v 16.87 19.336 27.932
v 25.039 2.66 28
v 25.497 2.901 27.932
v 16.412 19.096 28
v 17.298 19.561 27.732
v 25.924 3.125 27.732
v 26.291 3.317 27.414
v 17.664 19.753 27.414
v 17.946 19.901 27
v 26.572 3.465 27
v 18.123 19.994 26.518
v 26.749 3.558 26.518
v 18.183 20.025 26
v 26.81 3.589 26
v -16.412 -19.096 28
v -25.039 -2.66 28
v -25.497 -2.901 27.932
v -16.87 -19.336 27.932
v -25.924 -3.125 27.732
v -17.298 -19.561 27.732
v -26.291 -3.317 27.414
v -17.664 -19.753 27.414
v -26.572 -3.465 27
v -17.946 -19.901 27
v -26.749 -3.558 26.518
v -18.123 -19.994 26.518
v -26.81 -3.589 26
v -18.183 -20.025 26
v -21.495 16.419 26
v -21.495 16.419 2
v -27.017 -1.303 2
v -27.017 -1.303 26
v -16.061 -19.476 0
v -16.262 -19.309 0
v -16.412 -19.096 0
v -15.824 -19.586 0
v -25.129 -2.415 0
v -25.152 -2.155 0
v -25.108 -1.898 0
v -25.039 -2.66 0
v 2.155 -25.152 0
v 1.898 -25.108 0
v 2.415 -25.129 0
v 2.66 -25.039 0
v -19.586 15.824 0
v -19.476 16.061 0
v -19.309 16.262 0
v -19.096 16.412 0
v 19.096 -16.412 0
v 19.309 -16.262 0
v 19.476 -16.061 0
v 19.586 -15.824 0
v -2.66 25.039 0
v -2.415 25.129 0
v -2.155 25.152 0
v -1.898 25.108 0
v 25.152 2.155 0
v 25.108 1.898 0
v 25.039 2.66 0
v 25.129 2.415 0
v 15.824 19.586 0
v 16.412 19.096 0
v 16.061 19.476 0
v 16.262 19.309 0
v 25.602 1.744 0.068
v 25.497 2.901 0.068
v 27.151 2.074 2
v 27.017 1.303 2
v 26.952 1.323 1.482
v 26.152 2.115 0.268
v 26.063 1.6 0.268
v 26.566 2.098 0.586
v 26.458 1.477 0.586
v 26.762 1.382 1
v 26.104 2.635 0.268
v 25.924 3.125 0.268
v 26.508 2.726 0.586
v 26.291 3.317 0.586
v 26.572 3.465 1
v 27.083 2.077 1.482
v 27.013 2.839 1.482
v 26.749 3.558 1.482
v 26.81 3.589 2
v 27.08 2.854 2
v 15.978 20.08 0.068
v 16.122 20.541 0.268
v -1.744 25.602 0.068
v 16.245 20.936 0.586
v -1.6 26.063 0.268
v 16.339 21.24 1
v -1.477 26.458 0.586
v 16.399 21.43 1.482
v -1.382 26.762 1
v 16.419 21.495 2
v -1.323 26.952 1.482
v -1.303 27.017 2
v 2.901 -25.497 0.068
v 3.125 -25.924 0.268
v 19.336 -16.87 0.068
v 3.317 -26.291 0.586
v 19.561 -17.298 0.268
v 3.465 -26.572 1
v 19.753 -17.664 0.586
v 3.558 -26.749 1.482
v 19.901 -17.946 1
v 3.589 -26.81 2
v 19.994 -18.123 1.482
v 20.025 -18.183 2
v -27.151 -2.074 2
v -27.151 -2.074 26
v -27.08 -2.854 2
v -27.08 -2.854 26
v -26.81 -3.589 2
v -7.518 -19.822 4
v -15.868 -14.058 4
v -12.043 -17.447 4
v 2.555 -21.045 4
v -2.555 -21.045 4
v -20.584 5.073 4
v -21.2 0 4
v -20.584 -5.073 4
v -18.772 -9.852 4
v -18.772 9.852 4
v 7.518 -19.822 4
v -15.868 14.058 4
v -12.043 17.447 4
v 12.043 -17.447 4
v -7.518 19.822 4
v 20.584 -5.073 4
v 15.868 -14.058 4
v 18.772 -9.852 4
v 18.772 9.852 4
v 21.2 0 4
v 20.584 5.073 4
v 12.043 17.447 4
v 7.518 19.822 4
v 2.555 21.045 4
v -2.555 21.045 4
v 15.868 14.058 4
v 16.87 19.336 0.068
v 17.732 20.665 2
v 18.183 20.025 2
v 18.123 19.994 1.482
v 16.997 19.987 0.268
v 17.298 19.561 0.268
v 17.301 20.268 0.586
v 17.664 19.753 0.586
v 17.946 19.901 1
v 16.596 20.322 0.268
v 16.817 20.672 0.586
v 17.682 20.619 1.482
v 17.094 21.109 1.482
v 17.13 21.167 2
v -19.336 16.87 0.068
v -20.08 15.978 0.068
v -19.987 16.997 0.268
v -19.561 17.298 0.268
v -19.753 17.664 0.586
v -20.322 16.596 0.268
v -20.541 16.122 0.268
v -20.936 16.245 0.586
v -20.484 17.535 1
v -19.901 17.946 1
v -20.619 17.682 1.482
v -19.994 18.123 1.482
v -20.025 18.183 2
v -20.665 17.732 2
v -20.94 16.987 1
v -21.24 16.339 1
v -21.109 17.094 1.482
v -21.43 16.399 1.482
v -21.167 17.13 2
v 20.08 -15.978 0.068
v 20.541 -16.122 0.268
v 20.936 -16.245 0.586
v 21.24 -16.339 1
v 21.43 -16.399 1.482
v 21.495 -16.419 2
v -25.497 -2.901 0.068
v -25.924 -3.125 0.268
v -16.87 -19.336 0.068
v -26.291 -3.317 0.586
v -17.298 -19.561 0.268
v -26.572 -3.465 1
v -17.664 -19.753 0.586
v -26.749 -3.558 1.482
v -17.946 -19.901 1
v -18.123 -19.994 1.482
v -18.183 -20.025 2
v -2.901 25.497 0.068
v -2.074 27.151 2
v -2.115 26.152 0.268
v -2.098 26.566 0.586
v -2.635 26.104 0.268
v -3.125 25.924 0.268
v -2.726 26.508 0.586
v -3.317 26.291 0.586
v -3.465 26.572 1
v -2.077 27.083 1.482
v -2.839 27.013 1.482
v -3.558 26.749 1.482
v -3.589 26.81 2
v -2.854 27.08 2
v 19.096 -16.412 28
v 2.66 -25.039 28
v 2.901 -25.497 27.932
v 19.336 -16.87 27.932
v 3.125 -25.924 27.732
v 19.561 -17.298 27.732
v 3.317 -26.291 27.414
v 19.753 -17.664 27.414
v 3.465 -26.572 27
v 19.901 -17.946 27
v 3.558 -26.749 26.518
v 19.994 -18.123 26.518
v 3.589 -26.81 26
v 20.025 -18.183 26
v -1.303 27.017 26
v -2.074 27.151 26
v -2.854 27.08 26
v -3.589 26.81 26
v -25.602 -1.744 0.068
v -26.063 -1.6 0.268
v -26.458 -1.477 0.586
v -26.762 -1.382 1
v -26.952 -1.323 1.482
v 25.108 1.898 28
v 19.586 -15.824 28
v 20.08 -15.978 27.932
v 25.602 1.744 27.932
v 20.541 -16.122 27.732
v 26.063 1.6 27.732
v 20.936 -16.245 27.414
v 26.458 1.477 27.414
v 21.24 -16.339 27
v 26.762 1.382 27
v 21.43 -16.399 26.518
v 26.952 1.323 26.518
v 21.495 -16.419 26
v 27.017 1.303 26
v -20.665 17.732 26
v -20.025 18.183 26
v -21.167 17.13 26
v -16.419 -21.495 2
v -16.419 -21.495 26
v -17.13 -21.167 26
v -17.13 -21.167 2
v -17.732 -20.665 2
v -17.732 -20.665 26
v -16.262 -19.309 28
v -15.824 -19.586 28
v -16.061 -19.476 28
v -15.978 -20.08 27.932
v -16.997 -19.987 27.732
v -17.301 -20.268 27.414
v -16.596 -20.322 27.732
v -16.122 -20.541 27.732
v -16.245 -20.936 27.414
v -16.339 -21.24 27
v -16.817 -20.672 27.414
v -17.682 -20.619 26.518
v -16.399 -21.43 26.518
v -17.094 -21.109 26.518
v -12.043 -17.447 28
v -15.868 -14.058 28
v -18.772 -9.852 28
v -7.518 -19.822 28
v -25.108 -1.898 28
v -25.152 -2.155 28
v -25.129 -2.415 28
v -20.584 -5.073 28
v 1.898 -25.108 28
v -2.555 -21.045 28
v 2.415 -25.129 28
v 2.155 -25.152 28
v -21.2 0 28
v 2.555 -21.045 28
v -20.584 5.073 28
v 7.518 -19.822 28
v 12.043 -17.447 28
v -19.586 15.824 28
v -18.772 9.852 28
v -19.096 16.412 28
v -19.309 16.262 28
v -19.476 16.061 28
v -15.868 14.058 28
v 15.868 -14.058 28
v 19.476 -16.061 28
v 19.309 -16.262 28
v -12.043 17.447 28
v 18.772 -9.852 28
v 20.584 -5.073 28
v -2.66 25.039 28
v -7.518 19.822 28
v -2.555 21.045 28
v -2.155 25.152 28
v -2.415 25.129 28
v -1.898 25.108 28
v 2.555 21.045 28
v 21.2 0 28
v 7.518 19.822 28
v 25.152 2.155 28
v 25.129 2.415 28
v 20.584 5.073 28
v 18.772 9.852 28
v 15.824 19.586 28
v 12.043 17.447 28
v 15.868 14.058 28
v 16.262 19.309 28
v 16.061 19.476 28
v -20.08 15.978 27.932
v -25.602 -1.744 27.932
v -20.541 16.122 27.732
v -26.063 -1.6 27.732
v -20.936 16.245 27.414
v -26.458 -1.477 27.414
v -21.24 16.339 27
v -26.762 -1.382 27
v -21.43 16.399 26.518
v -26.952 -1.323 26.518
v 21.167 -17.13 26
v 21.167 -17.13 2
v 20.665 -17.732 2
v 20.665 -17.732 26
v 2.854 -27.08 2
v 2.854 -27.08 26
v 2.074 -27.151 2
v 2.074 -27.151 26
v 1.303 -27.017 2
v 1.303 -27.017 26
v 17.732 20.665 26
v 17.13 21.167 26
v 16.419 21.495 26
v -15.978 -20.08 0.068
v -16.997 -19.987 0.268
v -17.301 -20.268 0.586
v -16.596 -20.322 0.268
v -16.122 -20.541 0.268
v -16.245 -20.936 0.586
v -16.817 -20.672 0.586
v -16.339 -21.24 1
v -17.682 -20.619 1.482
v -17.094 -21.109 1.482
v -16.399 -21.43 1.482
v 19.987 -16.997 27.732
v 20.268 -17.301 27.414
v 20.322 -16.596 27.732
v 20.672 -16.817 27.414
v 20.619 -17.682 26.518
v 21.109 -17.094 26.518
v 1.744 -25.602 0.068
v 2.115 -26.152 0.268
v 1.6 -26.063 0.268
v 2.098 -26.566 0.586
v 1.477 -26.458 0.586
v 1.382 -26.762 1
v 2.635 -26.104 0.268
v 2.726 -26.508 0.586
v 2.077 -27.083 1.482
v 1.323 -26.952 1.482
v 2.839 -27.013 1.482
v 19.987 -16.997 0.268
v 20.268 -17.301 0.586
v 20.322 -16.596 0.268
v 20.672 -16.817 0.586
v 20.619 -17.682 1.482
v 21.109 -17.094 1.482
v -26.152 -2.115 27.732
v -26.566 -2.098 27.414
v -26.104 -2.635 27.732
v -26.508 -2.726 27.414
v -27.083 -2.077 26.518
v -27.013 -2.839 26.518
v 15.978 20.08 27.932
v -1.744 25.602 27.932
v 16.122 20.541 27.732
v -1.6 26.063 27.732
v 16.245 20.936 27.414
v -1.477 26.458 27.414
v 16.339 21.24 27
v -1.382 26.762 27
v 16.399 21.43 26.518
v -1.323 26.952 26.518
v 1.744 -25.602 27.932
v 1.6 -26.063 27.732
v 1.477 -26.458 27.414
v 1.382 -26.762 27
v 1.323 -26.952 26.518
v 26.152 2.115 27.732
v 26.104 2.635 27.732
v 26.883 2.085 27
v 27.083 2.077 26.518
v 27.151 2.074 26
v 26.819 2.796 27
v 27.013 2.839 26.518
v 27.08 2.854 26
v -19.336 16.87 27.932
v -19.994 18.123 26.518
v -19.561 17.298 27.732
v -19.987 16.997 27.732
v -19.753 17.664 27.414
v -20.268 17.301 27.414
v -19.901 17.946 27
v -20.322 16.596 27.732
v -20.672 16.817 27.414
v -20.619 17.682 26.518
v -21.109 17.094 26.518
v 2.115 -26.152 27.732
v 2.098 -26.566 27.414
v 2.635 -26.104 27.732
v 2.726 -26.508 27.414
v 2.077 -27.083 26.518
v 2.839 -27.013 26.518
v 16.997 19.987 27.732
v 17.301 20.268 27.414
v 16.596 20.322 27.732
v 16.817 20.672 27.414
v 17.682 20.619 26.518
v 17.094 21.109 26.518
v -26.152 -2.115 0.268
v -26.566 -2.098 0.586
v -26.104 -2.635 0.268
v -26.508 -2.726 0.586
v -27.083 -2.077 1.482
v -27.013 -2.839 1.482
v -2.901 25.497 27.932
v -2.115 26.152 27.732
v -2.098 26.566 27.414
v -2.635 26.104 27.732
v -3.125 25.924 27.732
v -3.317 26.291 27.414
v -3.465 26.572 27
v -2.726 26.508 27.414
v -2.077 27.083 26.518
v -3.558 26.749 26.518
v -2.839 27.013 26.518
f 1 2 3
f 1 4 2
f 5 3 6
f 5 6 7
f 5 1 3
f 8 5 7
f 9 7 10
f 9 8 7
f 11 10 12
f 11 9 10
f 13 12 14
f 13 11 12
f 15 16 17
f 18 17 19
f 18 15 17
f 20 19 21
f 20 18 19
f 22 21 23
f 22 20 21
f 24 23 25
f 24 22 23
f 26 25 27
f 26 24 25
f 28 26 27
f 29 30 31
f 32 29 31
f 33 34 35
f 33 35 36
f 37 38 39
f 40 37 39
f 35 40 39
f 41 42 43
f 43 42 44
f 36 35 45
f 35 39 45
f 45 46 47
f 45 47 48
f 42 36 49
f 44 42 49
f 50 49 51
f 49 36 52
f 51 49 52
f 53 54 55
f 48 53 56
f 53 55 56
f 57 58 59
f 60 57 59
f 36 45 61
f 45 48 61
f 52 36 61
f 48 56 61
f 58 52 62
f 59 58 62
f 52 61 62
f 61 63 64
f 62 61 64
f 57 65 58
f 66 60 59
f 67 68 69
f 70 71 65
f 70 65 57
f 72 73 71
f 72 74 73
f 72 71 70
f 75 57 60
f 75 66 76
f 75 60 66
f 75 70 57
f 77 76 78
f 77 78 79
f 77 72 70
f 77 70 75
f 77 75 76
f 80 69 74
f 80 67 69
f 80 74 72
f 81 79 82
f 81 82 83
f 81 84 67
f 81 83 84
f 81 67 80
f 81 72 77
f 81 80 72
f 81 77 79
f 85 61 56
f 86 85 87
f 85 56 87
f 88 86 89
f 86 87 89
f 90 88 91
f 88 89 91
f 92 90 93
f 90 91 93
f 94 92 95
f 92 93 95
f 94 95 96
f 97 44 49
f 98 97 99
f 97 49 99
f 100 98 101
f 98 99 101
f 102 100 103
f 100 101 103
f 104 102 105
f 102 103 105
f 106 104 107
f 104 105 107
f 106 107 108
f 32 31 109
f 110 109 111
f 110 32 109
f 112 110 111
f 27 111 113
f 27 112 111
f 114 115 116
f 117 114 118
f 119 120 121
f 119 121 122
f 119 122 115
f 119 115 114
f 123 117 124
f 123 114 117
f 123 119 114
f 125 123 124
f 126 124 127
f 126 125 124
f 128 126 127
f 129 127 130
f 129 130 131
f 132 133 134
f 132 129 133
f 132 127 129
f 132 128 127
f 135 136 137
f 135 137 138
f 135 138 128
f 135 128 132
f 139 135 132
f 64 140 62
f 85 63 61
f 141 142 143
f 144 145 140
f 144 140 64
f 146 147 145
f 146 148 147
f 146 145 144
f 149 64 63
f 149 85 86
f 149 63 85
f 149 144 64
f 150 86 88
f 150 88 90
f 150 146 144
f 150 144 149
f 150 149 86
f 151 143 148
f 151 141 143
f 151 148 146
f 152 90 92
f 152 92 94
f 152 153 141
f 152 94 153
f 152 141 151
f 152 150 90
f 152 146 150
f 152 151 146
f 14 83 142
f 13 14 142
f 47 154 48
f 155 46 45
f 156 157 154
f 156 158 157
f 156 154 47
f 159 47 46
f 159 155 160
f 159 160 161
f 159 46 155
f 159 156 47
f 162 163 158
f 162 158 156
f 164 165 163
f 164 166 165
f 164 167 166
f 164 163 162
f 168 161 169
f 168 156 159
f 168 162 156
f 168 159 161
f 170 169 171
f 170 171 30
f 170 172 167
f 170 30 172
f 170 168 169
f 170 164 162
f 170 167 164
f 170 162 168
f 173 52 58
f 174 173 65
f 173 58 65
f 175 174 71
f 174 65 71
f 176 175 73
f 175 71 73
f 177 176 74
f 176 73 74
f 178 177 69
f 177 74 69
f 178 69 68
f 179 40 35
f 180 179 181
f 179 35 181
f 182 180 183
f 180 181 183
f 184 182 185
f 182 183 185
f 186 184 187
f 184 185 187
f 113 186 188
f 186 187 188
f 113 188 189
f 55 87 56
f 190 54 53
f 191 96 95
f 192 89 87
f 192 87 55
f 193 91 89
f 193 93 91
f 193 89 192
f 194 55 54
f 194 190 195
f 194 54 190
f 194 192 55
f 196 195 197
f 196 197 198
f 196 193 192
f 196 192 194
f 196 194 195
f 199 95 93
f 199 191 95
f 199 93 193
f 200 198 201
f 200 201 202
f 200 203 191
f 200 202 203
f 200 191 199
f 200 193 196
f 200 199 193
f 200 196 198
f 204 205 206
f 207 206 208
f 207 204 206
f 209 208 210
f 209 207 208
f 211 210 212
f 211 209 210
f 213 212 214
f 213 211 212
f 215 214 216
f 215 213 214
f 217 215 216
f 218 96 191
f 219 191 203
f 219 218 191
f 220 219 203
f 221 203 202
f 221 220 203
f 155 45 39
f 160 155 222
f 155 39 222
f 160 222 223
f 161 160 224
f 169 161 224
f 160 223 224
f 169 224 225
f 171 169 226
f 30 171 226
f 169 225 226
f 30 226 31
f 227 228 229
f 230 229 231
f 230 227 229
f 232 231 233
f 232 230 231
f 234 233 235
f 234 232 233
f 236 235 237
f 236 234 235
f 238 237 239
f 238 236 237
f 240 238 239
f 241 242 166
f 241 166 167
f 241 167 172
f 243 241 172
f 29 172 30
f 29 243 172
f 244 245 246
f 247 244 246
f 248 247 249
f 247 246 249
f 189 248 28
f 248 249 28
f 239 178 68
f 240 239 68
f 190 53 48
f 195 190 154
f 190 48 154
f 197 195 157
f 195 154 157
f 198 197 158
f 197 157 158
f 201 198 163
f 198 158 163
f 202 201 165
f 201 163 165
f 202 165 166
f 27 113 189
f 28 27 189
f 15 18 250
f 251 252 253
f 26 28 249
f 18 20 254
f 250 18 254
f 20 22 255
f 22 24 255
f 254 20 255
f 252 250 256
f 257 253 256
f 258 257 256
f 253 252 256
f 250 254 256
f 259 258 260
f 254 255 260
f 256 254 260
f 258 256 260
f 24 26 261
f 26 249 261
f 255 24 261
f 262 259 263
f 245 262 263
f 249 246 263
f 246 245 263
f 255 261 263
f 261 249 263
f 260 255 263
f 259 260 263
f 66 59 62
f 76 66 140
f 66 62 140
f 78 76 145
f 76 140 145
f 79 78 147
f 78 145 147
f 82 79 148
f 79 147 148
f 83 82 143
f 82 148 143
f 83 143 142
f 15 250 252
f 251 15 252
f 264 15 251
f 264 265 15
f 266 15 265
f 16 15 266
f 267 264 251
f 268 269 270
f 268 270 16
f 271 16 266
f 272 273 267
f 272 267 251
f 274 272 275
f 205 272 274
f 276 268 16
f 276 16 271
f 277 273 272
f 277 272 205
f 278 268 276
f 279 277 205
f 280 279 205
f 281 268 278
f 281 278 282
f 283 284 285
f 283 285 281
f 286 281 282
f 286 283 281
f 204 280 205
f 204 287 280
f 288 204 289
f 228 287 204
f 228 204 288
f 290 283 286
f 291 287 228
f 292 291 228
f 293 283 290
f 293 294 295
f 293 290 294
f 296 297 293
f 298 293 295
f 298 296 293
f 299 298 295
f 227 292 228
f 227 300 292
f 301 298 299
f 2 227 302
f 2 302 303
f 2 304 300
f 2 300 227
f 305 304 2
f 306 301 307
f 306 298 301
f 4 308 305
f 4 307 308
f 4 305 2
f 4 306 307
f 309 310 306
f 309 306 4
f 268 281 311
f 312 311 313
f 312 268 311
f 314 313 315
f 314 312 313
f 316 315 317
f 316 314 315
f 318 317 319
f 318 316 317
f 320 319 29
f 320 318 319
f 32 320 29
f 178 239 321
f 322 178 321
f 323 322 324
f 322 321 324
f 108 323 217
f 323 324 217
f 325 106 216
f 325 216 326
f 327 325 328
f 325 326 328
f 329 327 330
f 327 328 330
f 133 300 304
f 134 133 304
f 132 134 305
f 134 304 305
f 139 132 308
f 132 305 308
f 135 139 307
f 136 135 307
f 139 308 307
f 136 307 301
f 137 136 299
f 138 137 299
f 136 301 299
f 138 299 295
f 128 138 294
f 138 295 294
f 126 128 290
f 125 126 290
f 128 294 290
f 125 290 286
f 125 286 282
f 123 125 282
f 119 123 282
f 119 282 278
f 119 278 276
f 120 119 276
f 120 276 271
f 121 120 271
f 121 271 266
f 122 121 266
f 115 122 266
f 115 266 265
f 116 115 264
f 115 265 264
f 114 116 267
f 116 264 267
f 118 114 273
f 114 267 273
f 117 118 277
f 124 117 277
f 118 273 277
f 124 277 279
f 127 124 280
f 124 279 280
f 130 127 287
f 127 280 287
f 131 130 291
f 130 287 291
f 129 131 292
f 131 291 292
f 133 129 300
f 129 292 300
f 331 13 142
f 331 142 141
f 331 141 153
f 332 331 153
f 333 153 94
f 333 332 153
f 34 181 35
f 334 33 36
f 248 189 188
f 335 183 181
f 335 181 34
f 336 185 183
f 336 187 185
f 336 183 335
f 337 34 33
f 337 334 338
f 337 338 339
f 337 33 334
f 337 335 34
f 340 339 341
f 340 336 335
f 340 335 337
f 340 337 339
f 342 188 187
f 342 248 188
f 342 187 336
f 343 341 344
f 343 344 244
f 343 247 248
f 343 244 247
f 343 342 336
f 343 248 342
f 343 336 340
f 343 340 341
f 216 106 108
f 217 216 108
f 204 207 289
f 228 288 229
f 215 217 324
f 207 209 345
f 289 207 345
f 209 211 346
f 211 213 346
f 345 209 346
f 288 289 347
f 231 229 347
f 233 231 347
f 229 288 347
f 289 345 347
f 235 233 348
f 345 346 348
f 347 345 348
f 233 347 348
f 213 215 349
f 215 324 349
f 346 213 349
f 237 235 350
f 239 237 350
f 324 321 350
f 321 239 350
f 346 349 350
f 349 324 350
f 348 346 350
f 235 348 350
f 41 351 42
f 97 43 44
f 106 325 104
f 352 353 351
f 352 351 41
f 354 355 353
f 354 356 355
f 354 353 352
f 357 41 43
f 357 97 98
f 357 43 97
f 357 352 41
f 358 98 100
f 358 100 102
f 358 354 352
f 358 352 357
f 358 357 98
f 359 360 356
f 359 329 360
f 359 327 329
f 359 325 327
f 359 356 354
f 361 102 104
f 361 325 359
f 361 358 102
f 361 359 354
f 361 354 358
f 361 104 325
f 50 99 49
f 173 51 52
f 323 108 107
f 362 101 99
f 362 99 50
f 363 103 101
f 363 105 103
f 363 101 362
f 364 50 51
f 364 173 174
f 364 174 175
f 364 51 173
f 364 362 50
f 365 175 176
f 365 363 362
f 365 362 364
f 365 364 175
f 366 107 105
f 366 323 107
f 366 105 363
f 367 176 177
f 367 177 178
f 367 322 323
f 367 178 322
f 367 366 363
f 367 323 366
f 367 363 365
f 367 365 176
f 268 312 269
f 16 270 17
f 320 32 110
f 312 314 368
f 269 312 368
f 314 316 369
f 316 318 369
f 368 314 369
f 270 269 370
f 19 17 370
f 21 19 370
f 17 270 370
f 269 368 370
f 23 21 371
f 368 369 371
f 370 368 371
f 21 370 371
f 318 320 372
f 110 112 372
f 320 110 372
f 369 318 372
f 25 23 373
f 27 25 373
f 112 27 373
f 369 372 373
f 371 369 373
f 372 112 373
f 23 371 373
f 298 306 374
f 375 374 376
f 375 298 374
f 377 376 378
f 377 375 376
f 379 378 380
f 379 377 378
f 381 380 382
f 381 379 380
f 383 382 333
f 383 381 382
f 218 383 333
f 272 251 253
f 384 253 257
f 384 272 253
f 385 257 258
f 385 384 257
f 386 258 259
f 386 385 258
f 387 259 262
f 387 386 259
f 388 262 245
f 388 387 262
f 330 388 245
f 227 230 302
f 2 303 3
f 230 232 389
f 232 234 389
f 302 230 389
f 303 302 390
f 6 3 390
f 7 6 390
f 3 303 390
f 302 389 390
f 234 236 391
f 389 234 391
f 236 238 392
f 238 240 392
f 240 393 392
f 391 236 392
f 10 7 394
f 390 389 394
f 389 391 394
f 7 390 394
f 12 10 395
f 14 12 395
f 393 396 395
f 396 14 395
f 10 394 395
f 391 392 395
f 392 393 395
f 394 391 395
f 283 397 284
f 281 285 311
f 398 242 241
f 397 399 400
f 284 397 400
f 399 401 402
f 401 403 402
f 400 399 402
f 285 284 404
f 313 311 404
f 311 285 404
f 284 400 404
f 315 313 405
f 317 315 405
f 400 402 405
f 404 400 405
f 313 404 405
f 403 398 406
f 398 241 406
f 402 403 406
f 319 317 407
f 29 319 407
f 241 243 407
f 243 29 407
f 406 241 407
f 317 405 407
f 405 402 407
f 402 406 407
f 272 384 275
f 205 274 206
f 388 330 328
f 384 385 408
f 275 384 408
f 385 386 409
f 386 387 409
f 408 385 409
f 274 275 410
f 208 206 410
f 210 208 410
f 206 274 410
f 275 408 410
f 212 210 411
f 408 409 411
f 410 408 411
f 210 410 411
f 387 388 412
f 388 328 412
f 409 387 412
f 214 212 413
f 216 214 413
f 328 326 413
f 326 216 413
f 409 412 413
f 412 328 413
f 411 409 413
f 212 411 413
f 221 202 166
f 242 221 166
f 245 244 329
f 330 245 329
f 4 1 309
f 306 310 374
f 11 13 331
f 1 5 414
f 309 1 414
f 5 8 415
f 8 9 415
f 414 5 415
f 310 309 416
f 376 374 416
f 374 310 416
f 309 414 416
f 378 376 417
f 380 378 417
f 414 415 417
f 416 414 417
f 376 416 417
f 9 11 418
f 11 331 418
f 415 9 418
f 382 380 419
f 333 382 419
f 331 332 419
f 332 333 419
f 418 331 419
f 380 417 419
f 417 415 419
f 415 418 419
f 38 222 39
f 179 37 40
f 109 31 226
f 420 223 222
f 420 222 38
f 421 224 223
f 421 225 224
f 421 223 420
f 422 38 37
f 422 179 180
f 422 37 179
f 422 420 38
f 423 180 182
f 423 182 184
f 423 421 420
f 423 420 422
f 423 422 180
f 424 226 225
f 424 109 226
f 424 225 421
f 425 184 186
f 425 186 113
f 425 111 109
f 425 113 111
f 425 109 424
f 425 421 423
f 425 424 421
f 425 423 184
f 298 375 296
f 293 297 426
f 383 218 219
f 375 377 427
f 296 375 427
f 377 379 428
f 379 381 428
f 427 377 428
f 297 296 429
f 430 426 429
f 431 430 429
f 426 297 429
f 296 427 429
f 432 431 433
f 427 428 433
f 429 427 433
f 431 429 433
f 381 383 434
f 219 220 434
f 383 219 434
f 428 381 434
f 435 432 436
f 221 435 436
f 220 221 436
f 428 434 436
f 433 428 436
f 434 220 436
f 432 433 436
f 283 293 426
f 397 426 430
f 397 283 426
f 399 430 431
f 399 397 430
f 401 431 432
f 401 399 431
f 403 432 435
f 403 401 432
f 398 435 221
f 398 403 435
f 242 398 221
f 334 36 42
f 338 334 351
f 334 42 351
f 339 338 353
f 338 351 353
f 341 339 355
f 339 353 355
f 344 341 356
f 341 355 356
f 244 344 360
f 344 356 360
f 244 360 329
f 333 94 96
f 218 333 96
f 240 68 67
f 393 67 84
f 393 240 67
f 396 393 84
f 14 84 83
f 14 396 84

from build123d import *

# Parameters (mm, degrees)
PAD_DEPTH    = 28
SKETCH001_R  = 21.2
POCKET_DEPTH = 24
FILLET_R     = 3
FILLET001_R  = 2
FILLET002_R  = 2


with BuildPart() as part:
    # Sketch (on XY_Plane of Origin) → Pad (new body)
    with BuildSketch(Plane.XY):
        Polygon((21.125697, -17.605536), (27.387118, 2.48913), (17.605536, 21.125697), (-2.48913, 27.387118), (-21.125697, 17.605536), (-27.387118, -2.48913), (-17.605536, -21.125697), (2.48913, -27.387118), align=None)
    extrude(amount=PAD_DEPTH)

    # Sketch001 (on Face10 of Pad) → Pocket (cut)
    with BuildSketch(Plane.XY.offset(28)):
        Circle(SKETCH001_R)
    extrude(amount=-POCKET_DEPTH, mode=Mode.SUBTRACT)

    # Fillet
    fillet_edges = [part.edges().sort_by_distance(p)[0] for p in [
        (2.48913, -27.387118, 14),
        (21.125697, -17.605536, 14),
        (27.387118, 2.48913, 14),
        (17.605536, 21.125697, 14),
        (-2.48913, 27.387118, 14),
        (-21.125697, 17.605536, 14),
        (-27.387118, -2.48913, 14),
        (-17.605536, -21.125697, 14),
    ]]
    fillet(fillet_edges, radius=FILLET_R)

    # Fillet001
    fillet001_edges = [part.edges().sort_by_distance(p)[0] for p in [
        (-24.256408, 7.558203, 0),
        (-11.807414, 22.496327, 0),
        (7.558203, 24.256408, 0),
        (22.496327, 11.807414, 0),
        (24.256408, -7.558203, 0),
        (11.807414, -22.496327, 0),
        (-7.558203, -24.256408, 0),
        (-22.496327, -11.807414, 0),
    ]]
    fillet(fillet001_edges, radius=FILLET001_R)

    # Fillet002
    fillet002_edges = [part.edges().sort_by_distance(p)[0] for p in [
        (22.496327, 11.807414, 28),
        (24.256408, -7.558203, 28),
        (11.807414, -22.496327, 28),
        (7.558203, 24.256408, 28),
        (-11.807414, 22.496327, 28),
        (-24.256408, 7.558203, 28),
        (-22.496327, -11.807414, 28),
        (-7.558203, -24.256408, 28),
    ]]
    fillet(fillet002_edges, radius=FILLET002_R)


solid = part.part
